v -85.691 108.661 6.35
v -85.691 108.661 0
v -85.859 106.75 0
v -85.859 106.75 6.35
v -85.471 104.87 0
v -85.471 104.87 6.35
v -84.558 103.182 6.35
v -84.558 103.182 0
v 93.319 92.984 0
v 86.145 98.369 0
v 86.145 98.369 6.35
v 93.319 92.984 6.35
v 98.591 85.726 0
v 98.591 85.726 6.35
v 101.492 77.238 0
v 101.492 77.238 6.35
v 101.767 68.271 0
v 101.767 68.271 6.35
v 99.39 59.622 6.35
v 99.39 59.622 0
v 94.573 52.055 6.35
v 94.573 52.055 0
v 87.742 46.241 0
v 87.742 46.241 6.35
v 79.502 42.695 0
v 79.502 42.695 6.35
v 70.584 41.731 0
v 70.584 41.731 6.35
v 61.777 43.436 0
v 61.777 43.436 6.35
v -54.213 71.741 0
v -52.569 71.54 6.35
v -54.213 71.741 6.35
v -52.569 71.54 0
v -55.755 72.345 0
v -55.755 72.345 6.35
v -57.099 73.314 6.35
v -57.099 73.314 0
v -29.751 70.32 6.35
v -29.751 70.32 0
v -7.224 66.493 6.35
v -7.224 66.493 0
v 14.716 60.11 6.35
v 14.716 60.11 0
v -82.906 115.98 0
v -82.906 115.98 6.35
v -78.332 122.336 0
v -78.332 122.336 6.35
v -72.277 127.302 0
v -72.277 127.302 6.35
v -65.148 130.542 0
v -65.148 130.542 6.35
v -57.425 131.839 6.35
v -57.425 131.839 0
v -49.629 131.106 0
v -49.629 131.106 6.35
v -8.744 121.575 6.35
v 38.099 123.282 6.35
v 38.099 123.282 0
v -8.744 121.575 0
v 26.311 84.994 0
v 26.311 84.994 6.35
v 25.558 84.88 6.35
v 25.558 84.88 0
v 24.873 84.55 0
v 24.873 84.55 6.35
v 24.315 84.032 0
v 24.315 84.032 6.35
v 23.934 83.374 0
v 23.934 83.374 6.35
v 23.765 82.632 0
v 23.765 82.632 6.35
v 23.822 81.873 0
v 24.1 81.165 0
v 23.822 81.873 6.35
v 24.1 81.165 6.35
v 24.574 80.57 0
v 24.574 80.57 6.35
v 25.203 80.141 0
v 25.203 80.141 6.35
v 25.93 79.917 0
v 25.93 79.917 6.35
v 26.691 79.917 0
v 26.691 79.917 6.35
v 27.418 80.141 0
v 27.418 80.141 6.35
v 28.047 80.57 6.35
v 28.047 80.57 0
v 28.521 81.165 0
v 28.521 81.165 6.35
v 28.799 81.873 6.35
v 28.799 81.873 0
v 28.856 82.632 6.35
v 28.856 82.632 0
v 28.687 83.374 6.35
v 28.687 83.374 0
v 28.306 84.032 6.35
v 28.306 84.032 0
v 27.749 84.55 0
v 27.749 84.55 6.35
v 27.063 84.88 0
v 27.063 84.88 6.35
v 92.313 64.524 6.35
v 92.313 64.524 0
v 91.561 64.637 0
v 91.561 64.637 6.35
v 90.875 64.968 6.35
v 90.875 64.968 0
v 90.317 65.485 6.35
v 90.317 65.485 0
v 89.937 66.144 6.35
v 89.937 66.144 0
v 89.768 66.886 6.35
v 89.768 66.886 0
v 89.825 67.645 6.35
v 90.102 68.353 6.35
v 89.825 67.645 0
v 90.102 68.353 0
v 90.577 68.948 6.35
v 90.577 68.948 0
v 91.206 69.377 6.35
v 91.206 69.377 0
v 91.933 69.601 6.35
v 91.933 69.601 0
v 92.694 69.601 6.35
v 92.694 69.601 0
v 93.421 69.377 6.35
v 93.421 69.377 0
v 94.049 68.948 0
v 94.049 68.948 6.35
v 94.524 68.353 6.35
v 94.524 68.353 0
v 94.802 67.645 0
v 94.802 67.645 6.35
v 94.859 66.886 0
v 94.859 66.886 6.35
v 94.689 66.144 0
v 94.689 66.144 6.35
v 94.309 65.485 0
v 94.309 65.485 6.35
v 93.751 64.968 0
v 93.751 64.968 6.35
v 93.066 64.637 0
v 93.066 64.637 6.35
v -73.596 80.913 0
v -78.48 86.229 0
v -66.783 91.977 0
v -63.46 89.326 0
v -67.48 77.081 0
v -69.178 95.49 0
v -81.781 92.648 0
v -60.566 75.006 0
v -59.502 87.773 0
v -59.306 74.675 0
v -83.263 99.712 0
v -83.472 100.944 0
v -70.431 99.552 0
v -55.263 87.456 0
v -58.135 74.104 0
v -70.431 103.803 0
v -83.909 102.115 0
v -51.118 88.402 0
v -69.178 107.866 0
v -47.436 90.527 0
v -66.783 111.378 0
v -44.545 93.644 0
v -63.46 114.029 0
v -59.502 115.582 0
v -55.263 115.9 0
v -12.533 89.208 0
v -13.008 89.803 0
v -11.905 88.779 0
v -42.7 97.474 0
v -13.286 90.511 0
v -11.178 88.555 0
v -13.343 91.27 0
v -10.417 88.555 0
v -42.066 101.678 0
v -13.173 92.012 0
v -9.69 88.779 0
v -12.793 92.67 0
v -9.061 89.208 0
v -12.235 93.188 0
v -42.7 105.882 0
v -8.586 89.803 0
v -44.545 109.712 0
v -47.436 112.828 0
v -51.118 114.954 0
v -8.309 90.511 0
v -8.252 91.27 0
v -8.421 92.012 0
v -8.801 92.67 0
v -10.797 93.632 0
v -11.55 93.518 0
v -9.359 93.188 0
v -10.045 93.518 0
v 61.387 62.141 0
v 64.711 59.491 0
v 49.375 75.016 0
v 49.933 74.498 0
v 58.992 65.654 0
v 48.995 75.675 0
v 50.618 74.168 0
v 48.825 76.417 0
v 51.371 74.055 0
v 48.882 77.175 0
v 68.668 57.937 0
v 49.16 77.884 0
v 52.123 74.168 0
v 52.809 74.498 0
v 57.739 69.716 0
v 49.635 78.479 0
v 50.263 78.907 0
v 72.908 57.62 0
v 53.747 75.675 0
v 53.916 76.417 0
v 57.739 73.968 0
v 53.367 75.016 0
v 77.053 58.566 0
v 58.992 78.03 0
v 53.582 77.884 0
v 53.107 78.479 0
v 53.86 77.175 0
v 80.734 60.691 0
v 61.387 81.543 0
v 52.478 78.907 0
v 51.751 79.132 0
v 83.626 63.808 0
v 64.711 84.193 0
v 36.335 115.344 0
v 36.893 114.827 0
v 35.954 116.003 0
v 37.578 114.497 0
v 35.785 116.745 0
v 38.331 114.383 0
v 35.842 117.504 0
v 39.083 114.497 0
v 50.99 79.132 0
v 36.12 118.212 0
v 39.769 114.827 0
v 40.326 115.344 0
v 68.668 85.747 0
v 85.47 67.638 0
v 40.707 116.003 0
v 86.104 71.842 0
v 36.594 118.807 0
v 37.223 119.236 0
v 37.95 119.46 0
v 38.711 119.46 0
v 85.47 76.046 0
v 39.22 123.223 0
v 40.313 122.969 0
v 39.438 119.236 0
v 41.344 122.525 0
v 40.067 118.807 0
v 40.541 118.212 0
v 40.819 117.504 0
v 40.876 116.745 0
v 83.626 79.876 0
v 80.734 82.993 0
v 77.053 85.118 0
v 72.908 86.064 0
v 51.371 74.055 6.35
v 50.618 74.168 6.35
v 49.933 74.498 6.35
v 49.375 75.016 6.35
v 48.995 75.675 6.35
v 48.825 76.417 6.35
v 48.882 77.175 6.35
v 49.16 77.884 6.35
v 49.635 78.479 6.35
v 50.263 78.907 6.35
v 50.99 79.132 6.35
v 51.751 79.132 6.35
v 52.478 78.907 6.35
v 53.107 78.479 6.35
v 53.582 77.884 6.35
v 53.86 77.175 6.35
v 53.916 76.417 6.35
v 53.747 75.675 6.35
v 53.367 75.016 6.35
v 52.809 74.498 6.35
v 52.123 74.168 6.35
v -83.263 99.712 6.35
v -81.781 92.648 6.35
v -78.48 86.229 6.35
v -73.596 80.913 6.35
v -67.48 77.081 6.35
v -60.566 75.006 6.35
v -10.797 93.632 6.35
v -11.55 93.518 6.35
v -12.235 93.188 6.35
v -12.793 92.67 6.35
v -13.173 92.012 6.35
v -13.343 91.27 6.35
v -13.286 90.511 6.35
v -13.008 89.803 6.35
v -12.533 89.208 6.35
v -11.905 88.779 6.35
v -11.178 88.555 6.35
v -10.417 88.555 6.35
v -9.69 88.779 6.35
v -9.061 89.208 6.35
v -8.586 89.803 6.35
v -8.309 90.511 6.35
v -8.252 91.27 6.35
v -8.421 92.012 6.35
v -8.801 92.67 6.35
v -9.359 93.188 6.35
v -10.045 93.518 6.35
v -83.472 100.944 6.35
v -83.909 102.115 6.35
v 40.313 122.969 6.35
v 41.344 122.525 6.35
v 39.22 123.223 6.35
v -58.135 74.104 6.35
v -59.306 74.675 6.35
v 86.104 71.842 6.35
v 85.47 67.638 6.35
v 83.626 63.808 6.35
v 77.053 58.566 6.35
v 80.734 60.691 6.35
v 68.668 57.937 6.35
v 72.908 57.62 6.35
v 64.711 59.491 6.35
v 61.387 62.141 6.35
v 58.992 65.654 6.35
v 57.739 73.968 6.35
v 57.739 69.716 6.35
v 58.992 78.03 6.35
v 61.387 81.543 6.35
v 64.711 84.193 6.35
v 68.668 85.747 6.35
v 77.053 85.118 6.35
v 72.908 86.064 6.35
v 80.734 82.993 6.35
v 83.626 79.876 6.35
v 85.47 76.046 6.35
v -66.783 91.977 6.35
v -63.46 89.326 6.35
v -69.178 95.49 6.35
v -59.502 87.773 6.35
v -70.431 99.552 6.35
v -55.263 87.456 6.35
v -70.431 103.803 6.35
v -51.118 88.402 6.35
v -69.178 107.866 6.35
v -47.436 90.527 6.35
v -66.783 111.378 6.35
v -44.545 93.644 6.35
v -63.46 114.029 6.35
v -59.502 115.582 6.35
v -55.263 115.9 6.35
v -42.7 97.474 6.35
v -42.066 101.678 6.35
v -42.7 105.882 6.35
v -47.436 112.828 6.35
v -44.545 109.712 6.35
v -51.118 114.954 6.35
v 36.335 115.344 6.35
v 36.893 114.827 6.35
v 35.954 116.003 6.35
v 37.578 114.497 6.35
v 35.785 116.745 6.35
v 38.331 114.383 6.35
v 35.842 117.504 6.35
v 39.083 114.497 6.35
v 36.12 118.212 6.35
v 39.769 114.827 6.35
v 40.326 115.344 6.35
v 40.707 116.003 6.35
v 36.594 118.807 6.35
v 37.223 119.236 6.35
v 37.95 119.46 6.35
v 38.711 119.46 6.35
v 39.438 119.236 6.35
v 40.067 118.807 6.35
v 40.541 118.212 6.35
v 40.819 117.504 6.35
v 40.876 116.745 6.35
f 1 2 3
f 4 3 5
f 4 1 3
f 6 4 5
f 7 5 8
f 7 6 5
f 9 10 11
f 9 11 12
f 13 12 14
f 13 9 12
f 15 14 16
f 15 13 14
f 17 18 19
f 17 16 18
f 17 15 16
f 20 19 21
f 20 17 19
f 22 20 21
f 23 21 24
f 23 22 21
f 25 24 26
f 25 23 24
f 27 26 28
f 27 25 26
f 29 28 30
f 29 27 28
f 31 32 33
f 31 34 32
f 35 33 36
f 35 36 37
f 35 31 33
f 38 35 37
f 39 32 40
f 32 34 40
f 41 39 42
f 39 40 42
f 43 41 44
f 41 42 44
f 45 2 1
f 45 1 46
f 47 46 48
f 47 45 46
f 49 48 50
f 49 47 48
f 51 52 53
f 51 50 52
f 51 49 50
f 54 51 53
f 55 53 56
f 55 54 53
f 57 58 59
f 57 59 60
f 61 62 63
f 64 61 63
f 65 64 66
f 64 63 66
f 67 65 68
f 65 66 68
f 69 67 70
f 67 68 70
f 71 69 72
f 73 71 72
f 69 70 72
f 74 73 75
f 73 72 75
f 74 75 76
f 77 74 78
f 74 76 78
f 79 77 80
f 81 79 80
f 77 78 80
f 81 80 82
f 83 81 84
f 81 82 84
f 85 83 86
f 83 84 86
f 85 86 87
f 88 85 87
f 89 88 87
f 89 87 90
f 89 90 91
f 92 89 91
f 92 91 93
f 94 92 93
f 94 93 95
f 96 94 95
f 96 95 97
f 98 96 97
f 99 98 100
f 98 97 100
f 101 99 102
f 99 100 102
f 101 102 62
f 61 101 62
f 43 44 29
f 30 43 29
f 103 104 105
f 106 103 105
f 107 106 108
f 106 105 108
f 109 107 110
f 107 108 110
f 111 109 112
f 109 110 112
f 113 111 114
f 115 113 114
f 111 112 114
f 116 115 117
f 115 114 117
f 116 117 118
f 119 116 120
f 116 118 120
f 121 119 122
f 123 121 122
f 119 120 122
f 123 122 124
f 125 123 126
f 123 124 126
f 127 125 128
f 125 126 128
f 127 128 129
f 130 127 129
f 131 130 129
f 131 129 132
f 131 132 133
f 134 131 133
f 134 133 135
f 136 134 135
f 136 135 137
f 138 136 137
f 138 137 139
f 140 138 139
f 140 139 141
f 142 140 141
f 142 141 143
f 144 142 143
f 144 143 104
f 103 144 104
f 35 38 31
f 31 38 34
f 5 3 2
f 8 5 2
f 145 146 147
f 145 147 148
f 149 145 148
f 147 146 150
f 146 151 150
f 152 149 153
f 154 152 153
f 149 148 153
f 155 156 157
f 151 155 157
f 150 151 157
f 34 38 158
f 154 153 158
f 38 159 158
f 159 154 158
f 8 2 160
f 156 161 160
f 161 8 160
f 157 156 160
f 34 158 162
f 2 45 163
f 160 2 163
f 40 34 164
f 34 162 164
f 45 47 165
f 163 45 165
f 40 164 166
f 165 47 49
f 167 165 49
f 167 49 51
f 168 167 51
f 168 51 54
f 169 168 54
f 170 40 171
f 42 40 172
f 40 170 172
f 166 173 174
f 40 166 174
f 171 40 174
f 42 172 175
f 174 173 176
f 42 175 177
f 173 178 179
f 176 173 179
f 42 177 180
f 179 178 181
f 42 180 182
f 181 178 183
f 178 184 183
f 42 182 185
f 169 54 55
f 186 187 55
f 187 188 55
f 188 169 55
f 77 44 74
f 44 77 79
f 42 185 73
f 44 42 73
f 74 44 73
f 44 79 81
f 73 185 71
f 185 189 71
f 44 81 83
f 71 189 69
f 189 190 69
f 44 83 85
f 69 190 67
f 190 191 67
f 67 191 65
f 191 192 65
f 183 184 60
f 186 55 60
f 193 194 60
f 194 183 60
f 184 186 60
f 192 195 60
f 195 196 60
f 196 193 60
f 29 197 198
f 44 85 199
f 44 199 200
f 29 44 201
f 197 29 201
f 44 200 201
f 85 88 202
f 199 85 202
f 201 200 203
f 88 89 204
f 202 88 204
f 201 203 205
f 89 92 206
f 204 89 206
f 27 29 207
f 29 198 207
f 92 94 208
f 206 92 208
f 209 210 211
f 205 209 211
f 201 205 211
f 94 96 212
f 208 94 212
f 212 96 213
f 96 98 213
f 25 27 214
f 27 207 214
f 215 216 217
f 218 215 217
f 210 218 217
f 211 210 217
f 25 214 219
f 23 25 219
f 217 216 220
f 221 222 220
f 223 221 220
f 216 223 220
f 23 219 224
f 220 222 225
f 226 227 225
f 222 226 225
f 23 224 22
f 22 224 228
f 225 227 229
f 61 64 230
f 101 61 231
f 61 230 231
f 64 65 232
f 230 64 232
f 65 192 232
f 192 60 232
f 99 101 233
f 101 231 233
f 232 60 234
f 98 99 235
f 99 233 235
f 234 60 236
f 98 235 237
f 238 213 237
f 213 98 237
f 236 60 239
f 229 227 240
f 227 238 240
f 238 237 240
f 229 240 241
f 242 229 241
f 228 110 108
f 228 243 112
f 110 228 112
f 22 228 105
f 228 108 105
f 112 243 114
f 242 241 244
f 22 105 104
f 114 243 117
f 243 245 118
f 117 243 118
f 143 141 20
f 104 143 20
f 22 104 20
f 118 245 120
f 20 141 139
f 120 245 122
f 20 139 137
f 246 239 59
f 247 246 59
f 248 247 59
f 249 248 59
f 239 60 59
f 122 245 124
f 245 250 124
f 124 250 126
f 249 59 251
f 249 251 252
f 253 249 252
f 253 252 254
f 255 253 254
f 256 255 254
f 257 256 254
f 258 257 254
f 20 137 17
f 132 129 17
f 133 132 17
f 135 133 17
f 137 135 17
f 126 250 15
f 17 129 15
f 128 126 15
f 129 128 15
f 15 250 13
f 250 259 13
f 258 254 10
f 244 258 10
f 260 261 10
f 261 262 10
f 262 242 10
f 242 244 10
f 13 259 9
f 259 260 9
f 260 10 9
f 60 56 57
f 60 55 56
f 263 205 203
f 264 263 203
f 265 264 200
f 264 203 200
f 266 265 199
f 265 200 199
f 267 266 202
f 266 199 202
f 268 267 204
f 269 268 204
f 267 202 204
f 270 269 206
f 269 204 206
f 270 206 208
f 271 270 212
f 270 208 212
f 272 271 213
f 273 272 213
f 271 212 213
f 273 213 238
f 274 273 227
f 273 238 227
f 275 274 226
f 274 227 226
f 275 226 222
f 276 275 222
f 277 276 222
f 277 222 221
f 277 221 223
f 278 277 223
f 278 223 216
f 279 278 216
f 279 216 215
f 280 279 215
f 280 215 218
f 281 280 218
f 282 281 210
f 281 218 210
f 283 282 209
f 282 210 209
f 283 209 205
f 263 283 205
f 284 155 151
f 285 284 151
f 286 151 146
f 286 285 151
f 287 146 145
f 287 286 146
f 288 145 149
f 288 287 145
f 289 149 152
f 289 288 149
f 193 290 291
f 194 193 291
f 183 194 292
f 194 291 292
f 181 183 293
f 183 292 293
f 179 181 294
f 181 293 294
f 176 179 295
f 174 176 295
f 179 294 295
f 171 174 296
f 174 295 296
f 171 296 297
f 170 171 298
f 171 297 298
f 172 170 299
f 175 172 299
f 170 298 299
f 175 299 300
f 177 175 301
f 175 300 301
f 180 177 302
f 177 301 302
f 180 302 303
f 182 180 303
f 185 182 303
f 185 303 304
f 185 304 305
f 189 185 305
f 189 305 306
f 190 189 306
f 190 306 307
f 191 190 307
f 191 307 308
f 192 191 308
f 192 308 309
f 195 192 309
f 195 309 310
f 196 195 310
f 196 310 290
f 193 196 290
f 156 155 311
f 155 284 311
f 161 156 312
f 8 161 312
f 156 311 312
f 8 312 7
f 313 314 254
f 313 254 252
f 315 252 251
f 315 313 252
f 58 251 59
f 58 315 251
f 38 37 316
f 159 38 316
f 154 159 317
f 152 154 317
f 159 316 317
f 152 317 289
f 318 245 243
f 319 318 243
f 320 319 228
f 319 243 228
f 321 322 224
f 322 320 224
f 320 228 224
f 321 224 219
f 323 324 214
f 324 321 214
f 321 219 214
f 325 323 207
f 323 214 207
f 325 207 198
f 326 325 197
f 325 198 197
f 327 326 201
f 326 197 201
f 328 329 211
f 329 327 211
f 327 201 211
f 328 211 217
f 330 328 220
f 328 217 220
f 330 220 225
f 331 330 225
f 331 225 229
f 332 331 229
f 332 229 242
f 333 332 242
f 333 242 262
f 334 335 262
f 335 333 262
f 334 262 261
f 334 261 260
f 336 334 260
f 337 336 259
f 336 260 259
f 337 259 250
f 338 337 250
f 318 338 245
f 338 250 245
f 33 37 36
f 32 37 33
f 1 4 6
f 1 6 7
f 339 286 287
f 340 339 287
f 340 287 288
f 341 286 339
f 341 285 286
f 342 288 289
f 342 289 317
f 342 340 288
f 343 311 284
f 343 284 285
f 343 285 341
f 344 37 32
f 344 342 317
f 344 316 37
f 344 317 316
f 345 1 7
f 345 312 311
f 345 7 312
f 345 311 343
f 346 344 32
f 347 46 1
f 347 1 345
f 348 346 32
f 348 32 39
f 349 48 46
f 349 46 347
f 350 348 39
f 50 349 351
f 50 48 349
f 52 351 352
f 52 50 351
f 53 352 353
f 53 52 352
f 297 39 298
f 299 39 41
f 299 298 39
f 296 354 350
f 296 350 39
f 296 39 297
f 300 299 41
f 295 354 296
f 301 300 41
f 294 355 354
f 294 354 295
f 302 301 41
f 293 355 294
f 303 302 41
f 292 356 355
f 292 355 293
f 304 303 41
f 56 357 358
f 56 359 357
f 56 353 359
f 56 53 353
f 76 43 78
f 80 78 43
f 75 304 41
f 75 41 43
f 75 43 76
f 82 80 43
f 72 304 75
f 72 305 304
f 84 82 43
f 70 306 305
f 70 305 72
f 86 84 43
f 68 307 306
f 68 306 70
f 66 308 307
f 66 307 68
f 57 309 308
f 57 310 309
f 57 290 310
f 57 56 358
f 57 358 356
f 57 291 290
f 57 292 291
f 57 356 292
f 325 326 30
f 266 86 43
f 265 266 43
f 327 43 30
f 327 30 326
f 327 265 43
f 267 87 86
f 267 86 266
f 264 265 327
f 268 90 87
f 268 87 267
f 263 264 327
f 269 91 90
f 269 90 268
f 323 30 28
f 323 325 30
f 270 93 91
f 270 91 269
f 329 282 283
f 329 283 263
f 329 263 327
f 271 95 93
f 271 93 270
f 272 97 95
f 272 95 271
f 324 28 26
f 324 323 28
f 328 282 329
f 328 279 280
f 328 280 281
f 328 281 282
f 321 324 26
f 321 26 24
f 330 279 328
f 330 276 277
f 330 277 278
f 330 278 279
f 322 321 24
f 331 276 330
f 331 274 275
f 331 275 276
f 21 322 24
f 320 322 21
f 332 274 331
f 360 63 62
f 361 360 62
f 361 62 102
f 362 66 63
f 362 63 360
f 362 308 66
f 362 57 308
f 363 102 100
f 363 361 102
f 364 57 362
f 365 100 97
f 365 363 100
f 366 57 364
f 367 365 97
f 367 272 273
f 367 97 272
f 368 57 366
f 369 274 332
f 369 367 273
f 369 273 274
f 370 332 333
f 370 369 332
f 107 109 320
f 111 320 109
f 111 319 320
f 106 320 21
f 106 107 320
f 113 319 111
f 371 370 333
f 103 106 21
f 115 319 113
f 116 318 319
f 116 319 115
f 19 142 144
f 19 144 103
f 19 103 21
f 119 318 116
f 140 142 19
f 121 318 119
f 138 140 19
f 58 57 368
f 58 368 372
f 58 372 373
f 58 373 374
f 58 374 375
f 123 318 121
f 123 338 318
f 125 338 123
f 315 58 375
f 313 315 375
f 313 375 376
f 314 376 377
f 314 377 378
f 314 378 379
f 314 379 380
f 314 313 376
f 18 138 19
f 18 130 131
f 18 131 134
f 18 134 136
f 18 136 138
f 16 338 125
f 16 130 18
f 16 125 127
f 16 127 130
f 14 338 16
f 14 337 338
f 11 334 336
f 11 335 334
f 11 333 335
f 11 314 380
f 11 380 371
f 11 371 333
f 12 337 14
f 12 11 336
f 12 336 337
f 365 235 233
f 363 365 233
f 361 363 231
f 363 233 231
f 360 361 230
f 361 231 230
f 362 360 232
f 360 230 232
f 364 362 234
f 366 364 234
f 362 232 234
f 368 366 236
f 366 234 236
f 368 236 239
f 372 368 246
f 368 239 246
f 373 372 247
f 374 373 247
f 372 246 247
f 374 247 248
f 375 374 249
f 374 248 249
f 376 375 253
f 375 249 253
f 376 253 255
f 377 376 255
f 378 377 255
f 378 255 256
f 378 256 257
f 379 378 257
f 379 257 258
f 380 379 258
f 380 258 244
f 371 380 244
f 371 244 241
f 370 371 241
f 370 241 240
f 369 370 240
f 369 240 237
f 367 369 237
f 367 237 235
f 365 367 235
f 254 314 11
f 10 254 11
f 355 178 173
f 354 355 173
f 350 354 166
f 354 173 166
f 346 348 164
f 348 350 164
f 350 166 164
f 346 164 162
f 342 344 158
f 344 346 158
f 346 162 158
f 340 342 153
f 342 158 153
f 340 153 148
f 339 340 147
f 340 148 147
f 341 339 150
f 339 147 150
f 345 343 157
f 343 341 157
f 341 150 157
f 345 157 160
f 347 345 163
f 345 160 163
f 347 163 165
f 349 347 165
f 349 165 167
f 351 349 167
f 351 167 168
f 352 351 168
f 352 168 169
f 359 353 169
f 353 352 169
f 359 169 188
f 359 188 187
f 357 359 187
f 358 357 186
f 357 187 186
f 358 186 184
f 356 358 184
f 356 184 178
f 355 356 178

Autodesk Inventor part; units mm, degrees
ref_plane "YZ Plane" through (0, 0, 0) normal (1, 0, 0) x (0, 1, 0)
ref_plane "XZ Plane" through (0, 0, 0) normal (0, 1, 0) x (-1, 0, 0)
ref_plane "XY Plane" through (0, 0, 0) normal (0, 0, 1) x (1, 0, 0)
sketch "Sketch1" plane through (0, 0, 0) normal (0, 0, 1) x (1, 0, 0)
  circle A0 centre (71.842, 71.842) radius 50.8 construction
  circle A1 centre (-71.842, -71.842) radius 50.8 construction
  circle A2 centre (0, 0) radius 50.8 construction
  line L0 (-35.921, -35.921) -> (35.921, 35.921) construction
  line L1 (71.842, 71.842) -> (-71.842, -71.842) construction
  line L2 (-4.3707, 6.2419) -> (-4.3707, 50.6116) construction
  line L3 (-226.8798, -122.642) -> (638.5123, -122.642) construction
  circle A3 centre (147.8406, -65.492) radius 57.15 construction
  circle A4 centre (71.842, 71.842) radius 14.2621
  circle A5 centre (-71.842, -71.842) radius 14.2621
  circle A6 centre (-4.3707, 6.2419) radius 57.15 construction
  circle A7 centre (-71.842, -71.842) radius 30.1371 construction
  circle A8 centre (71.842, 71.842) radius 30.1371 construction
  circle A9 centre (-56.3286, 101.6778) radius 14.2621
  line L4 (-56.3286, 101.6778) -> (71.842, 71.842) construction
  circle A10 centre (71.842, 71.842) radius 14.3256 construction
  circle A11 centre (-71.842, -71.842) radius 14.3256 construction
  circle A12 centre (-78.675, 59.5778) radius 14.2621
  line L5 (-71.842, -71.842) -> (-78.675, 59.5778) construction
  circle A13 centre (-78.675, 59.5778) radius 23.8316 construction
  circle A14 centre (-56.3286, 101.6778) radius 23.8316 construction
  line L6 (14.7165, 60.1103) -> (61.7767, 43.4355)
  line L7 (-43.0113, -63.0652) -> (-59.0434, -10.4018)
  arc A15 (14.7165, 60.1103) -> (-59.0434, -10.4018) centre (-4.3707, 6.2419) ccw
  line L8 (-202.9564, 165.4321) -> (-177.9423, 161.0215)
  line L9 (-177.9423, 161.0215) -> (-204.4062, 10.9368) construction
  line L10 (-204.4062, 10.9368) -> (-229.4204, 15.3474) construction
  line L11 (-229.4204, 15.3474) -> (-202.9564, 165.4321) construction
  line L12 (-248.4004, -92.2937) -> (35.0702, -142.2772) construction
  line L13 (-201.8537, 171.6857) -> (161.0026, 107.7043) construction
  line L14 (-201.8537, 171.6857) -> (-248.4004, -92.2937) construction
  circle A16 centre (-147.7392, 94.6182) radius 31.75 construction
  line L15 (-77.4376, 35.7784) -> (-74.4797, -21.1106) construction
  line L16 (-190.4493, 163.2268) -> (-216.9133, 13.1421) construction
  line L17 (-193.206, 147.593) -> (-214.1566, 28.7759) construction
  circle A17 centre (-147.7392, 94.6182) radius 17.4625 construction
  circle A18 centre (-147.7392, 94.6182) radius 9.525
  circle A19 centre (-56.3286, 101.6778) radius 30.1816 construction
  line L18 (-202.9564, 165.4321) -> (-229.4204, 15.3474)
  arc A20 (61.7767, 43.4355) -> (78.6846, 101.1921) centre (71.842, 71.842) ccw
  arc A21 (-99.1524, -84.5852) -> (-43.0113, -63.0652) centre (-71.842, -71.842) ccw
  line L19 (-147.7392, 94.6182) -> (-131.3298, 100.5908) construction
  line L20 (-113.4287, 107.1063) -> (-182.0497, 82.1302) construction
  circle A22 centre (-182.0497, 82.1302) radius 4.7625 construction
  line L21 (0, 0) -> (-4.3707, 6.2419) construction
  circle A23 centre (71.842, 71.842) radius 28.6512 construction
  line L22 (62.334, 44.8145) -> (-61.0615, 88.2239) construction
  line L23 (75.2477, 100.2901) -> (-54.6333, 115.8388) construction
  line L24 (-177.9423, 161.0215) -> (78.6846, 101.1921)
  line L25 (-147.7392, 94.6182) -> (-125.7265, 22.8485) construction
  circle A24 centre (-125.7265, 22.8485) radius 31.75 construction
  circle A25 centre (-125.7265, 22.8485) radius 14.2621
  line L26 (-78.675, 59.5778) -> (-125.7265, 22.8485) construction
  circle A26 centre (-147.7392, 94.6182) radius 25.4 construction
  arc A27 (-99.1524, -84.5852) -> (-229.4204, 15.3474) centre (-260.2996, -159.7777) ccw
  circle A28 centre (-147.7392, 94.6182) radius 36.5125 construction
  line L27 (-180.8308, 110.0491) -> (-147.7392, 94.6182) construction
  arc A29 (-39.1085, 126.4648) -> (-49.6289, 131.1064) centre (-56.3286, 101.6778) ccw
  arc A30 (-38.1634, 52.3307) -> (-39.1085, 126.4648) centre (-65.0941, 89.0604) ccw
  arc A31 (14.7165, 60.1103) -> (-55.7287, 71.5022) centre (-51.7719, -127.535) ccw
  arc A32 (-49.6289, 131.1064) -> (-55.7287, 71.5022) centre (-56.3286, 101.6778) ccw
  line L28 (-10.7972, 91.0789) -> (26.3107, 82.4409) construction
  point P0 (-75.9587, 7.3339)
  point P1 (-203.6813, 88.1845)
  point P2 (-203.6813, 88.1845)
  point P3 (-144.7069, 111.8154)
  point P4 (-161.1163, 105.8429)
  point P5 (-164.1486, 88.6457)
  point P6 (-150.7715, 77.421)
  point P7 (-134.3622, 83.3936)
  point P8 (-123.871, 103.3056)
  point P9 (-143.3285, 119.6324)
  point P10 (-167.1967, 110.945)
  point P11 (-171.6074, 85.9309)
  point P12 (-152.1499, 69.6041)
  point P13 (-128.2817, 78.2914)
  point P14 (-160.2272, 128.9288)
  point P15 (-182.0497, 82.1302)
  point P16 (-135.2512, 60.3077)
  point P17 (-132.3084, 127.7098)
  point P18 (-163.1701, 61.5267)
  point P19 (-114.6476, 79.1874)
  point P20 (-49.4759, 131.0711)
  point P21 (7.7567, 86.7599)
  dimension "d7" = 101.6
  dimension "d18" = 47.6631
  dimension "d34" = 34.925
  dimension "d65" = 50.8
  dimension "d3" = 45
  dimension "d4" = 0
  dimension "d8" = 101.6
  dimension "d9" = 28.5242
  dimension "d10" = 101.6
  dimension "d11" = 114.3
  dimension "d12" = 114.3
  dimension "d13" = 15.875
  dimension "d14" = 15.875
  dimension "d15" = 131.5974
  dimension "d16" = 28.6512
  dimension "d17" = 131.5974
  dimension "d19" = 47.6631
  dimension "d22" = 25.4
  dimension "d23" = 152.4
  dimension "d26" = 268.0517
  dimension "d27" = 63.5
  dimension "d30" = 203.2
  dimension "d31" = 10
  dimension "d33" = 120.65
  dimension "d35" = 19.05
  dimension "d36" = 6.35
  dimension "d40" = 360
  dimension "d44" = 9.525
  dimension "d55" = 80
  dimension "d56" = 7.62
  dimension "d57" = 6.35
  dimension "d58" = 57.3024
  dimension "d59" = 63.5
  dimension "d60" = 75.0697
  dimension "d61" = 59.69
  dimension "d62" = 55
  dimension "d68" = 360
  dimension "d70" = 41.275
  dimension "d71" = 60
  dimension "d82" = 360
  dimension "d87" = 360
  dimension "d89" = 45
  dimension "d105" = 38.1
extrude "Extrusion1" add sketch "Sketch1" along normal blind 6.35 contours A29 A30 A31 A32 | A31 A30 A29 L24 A20 L6
hole "Hole1" at (-193.206, 147.593, 0) at (-203.6813, 88.1845, 0) at (-214.1566, 28.7759, 0) at (-131.3298, 100.5908, 0) at (-144.7069, 111.8154, 0) at (-161.1163, 105.8429, 0) at (-164.1486, 88.6457, 0) at (-150.7715, 77.421, 0) at (-134.3622, 83.3936, 0) at (-113.4287, 107.1063, 0) at (-182.0497, 82.1302, 0) at (-152.1499, 69.6041, 0) at (-171.6074, 85.9309, 0) at (-167.1967, 110.945, 0) at (-143.3285, 119.6324, 0) at (-123.871, 103.3056, 0) at (-128.2817, 78.2914, 0) at (-75.9587, 7.3339, 0) at (-180.8308, 110.0491, 0) at (-132.3084, 127.7098, 0) at (-114.6476, 79.1874, 0) at (-163.1701, 61.5267, 0) at (-10.7972, 91.0789, 0) at (26.3107, 82.4409, 0) direction (0, 0, 1) diameter 5.1054 end through all clearance for "Flat Head Machine Screw (82)" size "#10" standard "Ansi Unified Screw Threads"
sketch "Sketch2" plane through (0, 0, 6.35) normal (0, 0, 1) x (1, 0, 0)
  line L0 (78.6846, 101.1921) -> (-49.4759, 131.0711) construction
  circle A0 centre (-56.3286, 101.6778) radius 14.2621 construction
  line L1 (-76.7997, 106.4431) -> (-35.8574, 96.9125) construction
  line L2 (51.3709, 76.6074) -> (92.3132, 67.0767) construction
  line L3 (-56.3286, 101.6778) -> (71.842, 71.842) construction
  arc A1 (-49.4759, 131.0711) -> (-55.7287, 71.5022) centre (-56.3286, 101.6778) ccw projected
  arc A2 (14.7165, 60.1103) -> (-55.7287, 71.5022) centre (-51.7719, -127.535) ccw projected
  line L4 (14.7165, 60.1103) -> (61.7767, 43.4355) projected
  arc A3 (61.7767, 43.4355) -> (78.6846, 101.1921) centre (71.842, 71.842) ccw projected
  point P0 (0, 0)
hole "Hole2" at (92.3132, 67.0767, 6.35) at (51.3709, 76.6074, 6.35) direction (0, 0, -1) diameter 5.1054 end through all clearance for "Flat Head Machine Screw (82)" size "#10" standard "Ansi Unified Screw Threads"
sketch "Sketch3" plane through (0, 0, 6.35) normal (0, 0, 1) x (1, 0, 0)
  circle A0 centre (92.3132, 67.0767) radius 2.5527 construction
  circle A1 centre (51.3709, 76.6074) radius 2.5527 construction
  arc A2 (14.7165, 60.1103) -> (-55.7287, 71.5022) centre (-51.7719, -127.535) ccw construction
  line L0 (14.7165, 60.1103) -> (61.7767, 43.4355) construction
  arc A3 (61.7767, 43.4355) -> (78.6846, 101.1921) centre (71.842, 71.842) ccw construction
  line L1 (78.6846, 101.1921) -> (-49.4759, 131.0711) construction
  arc A4 (-49.4759, 131.0711) -> (-55.7287, 71.5022) centre (-56.3286, 101.6778) ccw construction
  circle A5 centre (71.842, 71.842) radius 14.2621 construction
  circle A6 centre (-56.3286, 101.6778) radius 14.2621 construction
  circle A7 centre (71.842, 71.842) radius 14.2621 construction
  line L2 (-56.3286, 101.6778) -> (71.842, 71.842) construction
  line L3 (30.0957, 81.5598) -> (38.3306, 116.936) construction
  line L4 (41.3443, 122.5253) -> (86.1452, 98.3687)
  arc A8 (61.7767, 43.4355) -> (78.6846, 101.1921) centre (71.842, 71.842) ccw construction
  line L5 (78.6846, 101.1921) -> (-49.4759, 131.0711) construction
  arc A9 (86.1452, 98.3687) -> (78.6846, 101.1921) centre (71.842, 71.842) ccw
  arc A10 (41.3443, 122.5253) -> (38.0994, 123.2818) centre (38.3306, 116.936) ccw
  arc A11 (36.8909, 110.7514) -> (36.9386, 110.7405) centre (38.3306, 116.936) ccw
  line L6 (38.0994, 123.2818) -> (-8.7442, 121.575)
  line L7 (78.6846, 101.1921) -> (-8.7442, 121.575)
  point P0 (0, 0)
  dimension "d90" = 42.8625
  dimension "d91" = 36.322
  dimension "d102" = 6.35
  dimension "d103" = 15.21
  dimension "d104" = 15.21
extrude "Extrusion2" add sketch "Sketch3" against normal up to surface (6.35 mm away)
sketch "Sketch4" plane through (0, 0, 6.35) normal (0, 0, 1) x (1, 0, 0)
  arc A0 (41.3443, 122.5253) -> (38.0994, 123.2818) centre (38.3306, 116.936) ccw construction
  point P0 (0, 0)
hole "Hole3" at (38.3306, 116.936, 6.35) direction (0, 0, -1) diameter 5.1054 end through all clearance for "Flat Head Machine Screw (82)" size "#10" standard "Ansi Unified Screw Threads"
sketch "Sketch5" plane through (0, 0, 6.35) normal (0, 0, 1) x (1, 0, 0)
  circle A0 centre (38.3306, 116.936) radius 2.5527 construction
  circle A1 centre (92.3132, 67.0767) radius 2.5527 construction
  circle A2 centre (51.3709, 76.6074) radius 2.5527 construction
  circle A3 centre (-10.7972, 91.0789) radius 2.5527 construction
  circle A4 centre (26.3107, 82.4409) radius 2.5527 construction
  arc A5 (14.7165, 60.1103) -> (-55.7287, 71.5022) centre (-51.7719, -127.535) ccw construction
  line L0 (14.7165, 60.1103) -> (61.7767, 43.4355) construction
  arc A6 (61.7767, 43.4355) -> (86.1452, 98.3687) centre (71.842, 71.842) ccw construction
  line L1 (86.1452, 98.3687) -> (41.3443, 122.5253) construction
  arc A7 (41.3443, 122.5253) -> (38.0994, 123.2818) centre (38.3306, 116.936) ccw construction
  line L2 (38.0994, 123.2818) -> (-8.7442, 121.575) construction
  line L3 (-8.7442, 121.575) -> (-49.4759, 131.0711) construction
  arc A8 (-49.4759, 131.0711) -> (-55.7287, 71.5022) centre (-56.3286, 101.6778) ccw projected
  circle A9 centre (71.842, 71.842) radius 14.2621 construction
  circle A10 centre (-56.3286, 101.6778) radius 14.2621 construction
  arc A11 (-49.4759, 131.0711) -> (-55.7287, 71.5022) centre (-56.3286, 101.6778) ccw construction
  line L4 (-86.3452, 104.8286) -> (-83.1507, 104.8286)
  arc A12 (14.7165, 60.1103) -> (-55.7287, 71.5022) centre (-51.7719, -127.535) ccw construction
  line L5 (-55.7287, 71.5022) -> (-55.7287, 74.6779)
  arc A13 (-83.1507, 104.8286) -> (-55.7287, 74.6779) centre (-56.3286, 101.6778) ccw
  point P0 (0, 0)
  dimension "d114" = 3.175
extrude "Extrusion3" cut sketch "Sketch5" against normal through all
fillet "Fillet1" radius 6.604 4 edges at (-83.1507, 104.8286, 3.175) (-86.3452, 104.8286, 3.175) (-55.7287, 74.6779, 3.175) (-55.7287, 71.5022, 3.175)
properties part number "GP10-002" material "Polycarbonate, Smoke"
